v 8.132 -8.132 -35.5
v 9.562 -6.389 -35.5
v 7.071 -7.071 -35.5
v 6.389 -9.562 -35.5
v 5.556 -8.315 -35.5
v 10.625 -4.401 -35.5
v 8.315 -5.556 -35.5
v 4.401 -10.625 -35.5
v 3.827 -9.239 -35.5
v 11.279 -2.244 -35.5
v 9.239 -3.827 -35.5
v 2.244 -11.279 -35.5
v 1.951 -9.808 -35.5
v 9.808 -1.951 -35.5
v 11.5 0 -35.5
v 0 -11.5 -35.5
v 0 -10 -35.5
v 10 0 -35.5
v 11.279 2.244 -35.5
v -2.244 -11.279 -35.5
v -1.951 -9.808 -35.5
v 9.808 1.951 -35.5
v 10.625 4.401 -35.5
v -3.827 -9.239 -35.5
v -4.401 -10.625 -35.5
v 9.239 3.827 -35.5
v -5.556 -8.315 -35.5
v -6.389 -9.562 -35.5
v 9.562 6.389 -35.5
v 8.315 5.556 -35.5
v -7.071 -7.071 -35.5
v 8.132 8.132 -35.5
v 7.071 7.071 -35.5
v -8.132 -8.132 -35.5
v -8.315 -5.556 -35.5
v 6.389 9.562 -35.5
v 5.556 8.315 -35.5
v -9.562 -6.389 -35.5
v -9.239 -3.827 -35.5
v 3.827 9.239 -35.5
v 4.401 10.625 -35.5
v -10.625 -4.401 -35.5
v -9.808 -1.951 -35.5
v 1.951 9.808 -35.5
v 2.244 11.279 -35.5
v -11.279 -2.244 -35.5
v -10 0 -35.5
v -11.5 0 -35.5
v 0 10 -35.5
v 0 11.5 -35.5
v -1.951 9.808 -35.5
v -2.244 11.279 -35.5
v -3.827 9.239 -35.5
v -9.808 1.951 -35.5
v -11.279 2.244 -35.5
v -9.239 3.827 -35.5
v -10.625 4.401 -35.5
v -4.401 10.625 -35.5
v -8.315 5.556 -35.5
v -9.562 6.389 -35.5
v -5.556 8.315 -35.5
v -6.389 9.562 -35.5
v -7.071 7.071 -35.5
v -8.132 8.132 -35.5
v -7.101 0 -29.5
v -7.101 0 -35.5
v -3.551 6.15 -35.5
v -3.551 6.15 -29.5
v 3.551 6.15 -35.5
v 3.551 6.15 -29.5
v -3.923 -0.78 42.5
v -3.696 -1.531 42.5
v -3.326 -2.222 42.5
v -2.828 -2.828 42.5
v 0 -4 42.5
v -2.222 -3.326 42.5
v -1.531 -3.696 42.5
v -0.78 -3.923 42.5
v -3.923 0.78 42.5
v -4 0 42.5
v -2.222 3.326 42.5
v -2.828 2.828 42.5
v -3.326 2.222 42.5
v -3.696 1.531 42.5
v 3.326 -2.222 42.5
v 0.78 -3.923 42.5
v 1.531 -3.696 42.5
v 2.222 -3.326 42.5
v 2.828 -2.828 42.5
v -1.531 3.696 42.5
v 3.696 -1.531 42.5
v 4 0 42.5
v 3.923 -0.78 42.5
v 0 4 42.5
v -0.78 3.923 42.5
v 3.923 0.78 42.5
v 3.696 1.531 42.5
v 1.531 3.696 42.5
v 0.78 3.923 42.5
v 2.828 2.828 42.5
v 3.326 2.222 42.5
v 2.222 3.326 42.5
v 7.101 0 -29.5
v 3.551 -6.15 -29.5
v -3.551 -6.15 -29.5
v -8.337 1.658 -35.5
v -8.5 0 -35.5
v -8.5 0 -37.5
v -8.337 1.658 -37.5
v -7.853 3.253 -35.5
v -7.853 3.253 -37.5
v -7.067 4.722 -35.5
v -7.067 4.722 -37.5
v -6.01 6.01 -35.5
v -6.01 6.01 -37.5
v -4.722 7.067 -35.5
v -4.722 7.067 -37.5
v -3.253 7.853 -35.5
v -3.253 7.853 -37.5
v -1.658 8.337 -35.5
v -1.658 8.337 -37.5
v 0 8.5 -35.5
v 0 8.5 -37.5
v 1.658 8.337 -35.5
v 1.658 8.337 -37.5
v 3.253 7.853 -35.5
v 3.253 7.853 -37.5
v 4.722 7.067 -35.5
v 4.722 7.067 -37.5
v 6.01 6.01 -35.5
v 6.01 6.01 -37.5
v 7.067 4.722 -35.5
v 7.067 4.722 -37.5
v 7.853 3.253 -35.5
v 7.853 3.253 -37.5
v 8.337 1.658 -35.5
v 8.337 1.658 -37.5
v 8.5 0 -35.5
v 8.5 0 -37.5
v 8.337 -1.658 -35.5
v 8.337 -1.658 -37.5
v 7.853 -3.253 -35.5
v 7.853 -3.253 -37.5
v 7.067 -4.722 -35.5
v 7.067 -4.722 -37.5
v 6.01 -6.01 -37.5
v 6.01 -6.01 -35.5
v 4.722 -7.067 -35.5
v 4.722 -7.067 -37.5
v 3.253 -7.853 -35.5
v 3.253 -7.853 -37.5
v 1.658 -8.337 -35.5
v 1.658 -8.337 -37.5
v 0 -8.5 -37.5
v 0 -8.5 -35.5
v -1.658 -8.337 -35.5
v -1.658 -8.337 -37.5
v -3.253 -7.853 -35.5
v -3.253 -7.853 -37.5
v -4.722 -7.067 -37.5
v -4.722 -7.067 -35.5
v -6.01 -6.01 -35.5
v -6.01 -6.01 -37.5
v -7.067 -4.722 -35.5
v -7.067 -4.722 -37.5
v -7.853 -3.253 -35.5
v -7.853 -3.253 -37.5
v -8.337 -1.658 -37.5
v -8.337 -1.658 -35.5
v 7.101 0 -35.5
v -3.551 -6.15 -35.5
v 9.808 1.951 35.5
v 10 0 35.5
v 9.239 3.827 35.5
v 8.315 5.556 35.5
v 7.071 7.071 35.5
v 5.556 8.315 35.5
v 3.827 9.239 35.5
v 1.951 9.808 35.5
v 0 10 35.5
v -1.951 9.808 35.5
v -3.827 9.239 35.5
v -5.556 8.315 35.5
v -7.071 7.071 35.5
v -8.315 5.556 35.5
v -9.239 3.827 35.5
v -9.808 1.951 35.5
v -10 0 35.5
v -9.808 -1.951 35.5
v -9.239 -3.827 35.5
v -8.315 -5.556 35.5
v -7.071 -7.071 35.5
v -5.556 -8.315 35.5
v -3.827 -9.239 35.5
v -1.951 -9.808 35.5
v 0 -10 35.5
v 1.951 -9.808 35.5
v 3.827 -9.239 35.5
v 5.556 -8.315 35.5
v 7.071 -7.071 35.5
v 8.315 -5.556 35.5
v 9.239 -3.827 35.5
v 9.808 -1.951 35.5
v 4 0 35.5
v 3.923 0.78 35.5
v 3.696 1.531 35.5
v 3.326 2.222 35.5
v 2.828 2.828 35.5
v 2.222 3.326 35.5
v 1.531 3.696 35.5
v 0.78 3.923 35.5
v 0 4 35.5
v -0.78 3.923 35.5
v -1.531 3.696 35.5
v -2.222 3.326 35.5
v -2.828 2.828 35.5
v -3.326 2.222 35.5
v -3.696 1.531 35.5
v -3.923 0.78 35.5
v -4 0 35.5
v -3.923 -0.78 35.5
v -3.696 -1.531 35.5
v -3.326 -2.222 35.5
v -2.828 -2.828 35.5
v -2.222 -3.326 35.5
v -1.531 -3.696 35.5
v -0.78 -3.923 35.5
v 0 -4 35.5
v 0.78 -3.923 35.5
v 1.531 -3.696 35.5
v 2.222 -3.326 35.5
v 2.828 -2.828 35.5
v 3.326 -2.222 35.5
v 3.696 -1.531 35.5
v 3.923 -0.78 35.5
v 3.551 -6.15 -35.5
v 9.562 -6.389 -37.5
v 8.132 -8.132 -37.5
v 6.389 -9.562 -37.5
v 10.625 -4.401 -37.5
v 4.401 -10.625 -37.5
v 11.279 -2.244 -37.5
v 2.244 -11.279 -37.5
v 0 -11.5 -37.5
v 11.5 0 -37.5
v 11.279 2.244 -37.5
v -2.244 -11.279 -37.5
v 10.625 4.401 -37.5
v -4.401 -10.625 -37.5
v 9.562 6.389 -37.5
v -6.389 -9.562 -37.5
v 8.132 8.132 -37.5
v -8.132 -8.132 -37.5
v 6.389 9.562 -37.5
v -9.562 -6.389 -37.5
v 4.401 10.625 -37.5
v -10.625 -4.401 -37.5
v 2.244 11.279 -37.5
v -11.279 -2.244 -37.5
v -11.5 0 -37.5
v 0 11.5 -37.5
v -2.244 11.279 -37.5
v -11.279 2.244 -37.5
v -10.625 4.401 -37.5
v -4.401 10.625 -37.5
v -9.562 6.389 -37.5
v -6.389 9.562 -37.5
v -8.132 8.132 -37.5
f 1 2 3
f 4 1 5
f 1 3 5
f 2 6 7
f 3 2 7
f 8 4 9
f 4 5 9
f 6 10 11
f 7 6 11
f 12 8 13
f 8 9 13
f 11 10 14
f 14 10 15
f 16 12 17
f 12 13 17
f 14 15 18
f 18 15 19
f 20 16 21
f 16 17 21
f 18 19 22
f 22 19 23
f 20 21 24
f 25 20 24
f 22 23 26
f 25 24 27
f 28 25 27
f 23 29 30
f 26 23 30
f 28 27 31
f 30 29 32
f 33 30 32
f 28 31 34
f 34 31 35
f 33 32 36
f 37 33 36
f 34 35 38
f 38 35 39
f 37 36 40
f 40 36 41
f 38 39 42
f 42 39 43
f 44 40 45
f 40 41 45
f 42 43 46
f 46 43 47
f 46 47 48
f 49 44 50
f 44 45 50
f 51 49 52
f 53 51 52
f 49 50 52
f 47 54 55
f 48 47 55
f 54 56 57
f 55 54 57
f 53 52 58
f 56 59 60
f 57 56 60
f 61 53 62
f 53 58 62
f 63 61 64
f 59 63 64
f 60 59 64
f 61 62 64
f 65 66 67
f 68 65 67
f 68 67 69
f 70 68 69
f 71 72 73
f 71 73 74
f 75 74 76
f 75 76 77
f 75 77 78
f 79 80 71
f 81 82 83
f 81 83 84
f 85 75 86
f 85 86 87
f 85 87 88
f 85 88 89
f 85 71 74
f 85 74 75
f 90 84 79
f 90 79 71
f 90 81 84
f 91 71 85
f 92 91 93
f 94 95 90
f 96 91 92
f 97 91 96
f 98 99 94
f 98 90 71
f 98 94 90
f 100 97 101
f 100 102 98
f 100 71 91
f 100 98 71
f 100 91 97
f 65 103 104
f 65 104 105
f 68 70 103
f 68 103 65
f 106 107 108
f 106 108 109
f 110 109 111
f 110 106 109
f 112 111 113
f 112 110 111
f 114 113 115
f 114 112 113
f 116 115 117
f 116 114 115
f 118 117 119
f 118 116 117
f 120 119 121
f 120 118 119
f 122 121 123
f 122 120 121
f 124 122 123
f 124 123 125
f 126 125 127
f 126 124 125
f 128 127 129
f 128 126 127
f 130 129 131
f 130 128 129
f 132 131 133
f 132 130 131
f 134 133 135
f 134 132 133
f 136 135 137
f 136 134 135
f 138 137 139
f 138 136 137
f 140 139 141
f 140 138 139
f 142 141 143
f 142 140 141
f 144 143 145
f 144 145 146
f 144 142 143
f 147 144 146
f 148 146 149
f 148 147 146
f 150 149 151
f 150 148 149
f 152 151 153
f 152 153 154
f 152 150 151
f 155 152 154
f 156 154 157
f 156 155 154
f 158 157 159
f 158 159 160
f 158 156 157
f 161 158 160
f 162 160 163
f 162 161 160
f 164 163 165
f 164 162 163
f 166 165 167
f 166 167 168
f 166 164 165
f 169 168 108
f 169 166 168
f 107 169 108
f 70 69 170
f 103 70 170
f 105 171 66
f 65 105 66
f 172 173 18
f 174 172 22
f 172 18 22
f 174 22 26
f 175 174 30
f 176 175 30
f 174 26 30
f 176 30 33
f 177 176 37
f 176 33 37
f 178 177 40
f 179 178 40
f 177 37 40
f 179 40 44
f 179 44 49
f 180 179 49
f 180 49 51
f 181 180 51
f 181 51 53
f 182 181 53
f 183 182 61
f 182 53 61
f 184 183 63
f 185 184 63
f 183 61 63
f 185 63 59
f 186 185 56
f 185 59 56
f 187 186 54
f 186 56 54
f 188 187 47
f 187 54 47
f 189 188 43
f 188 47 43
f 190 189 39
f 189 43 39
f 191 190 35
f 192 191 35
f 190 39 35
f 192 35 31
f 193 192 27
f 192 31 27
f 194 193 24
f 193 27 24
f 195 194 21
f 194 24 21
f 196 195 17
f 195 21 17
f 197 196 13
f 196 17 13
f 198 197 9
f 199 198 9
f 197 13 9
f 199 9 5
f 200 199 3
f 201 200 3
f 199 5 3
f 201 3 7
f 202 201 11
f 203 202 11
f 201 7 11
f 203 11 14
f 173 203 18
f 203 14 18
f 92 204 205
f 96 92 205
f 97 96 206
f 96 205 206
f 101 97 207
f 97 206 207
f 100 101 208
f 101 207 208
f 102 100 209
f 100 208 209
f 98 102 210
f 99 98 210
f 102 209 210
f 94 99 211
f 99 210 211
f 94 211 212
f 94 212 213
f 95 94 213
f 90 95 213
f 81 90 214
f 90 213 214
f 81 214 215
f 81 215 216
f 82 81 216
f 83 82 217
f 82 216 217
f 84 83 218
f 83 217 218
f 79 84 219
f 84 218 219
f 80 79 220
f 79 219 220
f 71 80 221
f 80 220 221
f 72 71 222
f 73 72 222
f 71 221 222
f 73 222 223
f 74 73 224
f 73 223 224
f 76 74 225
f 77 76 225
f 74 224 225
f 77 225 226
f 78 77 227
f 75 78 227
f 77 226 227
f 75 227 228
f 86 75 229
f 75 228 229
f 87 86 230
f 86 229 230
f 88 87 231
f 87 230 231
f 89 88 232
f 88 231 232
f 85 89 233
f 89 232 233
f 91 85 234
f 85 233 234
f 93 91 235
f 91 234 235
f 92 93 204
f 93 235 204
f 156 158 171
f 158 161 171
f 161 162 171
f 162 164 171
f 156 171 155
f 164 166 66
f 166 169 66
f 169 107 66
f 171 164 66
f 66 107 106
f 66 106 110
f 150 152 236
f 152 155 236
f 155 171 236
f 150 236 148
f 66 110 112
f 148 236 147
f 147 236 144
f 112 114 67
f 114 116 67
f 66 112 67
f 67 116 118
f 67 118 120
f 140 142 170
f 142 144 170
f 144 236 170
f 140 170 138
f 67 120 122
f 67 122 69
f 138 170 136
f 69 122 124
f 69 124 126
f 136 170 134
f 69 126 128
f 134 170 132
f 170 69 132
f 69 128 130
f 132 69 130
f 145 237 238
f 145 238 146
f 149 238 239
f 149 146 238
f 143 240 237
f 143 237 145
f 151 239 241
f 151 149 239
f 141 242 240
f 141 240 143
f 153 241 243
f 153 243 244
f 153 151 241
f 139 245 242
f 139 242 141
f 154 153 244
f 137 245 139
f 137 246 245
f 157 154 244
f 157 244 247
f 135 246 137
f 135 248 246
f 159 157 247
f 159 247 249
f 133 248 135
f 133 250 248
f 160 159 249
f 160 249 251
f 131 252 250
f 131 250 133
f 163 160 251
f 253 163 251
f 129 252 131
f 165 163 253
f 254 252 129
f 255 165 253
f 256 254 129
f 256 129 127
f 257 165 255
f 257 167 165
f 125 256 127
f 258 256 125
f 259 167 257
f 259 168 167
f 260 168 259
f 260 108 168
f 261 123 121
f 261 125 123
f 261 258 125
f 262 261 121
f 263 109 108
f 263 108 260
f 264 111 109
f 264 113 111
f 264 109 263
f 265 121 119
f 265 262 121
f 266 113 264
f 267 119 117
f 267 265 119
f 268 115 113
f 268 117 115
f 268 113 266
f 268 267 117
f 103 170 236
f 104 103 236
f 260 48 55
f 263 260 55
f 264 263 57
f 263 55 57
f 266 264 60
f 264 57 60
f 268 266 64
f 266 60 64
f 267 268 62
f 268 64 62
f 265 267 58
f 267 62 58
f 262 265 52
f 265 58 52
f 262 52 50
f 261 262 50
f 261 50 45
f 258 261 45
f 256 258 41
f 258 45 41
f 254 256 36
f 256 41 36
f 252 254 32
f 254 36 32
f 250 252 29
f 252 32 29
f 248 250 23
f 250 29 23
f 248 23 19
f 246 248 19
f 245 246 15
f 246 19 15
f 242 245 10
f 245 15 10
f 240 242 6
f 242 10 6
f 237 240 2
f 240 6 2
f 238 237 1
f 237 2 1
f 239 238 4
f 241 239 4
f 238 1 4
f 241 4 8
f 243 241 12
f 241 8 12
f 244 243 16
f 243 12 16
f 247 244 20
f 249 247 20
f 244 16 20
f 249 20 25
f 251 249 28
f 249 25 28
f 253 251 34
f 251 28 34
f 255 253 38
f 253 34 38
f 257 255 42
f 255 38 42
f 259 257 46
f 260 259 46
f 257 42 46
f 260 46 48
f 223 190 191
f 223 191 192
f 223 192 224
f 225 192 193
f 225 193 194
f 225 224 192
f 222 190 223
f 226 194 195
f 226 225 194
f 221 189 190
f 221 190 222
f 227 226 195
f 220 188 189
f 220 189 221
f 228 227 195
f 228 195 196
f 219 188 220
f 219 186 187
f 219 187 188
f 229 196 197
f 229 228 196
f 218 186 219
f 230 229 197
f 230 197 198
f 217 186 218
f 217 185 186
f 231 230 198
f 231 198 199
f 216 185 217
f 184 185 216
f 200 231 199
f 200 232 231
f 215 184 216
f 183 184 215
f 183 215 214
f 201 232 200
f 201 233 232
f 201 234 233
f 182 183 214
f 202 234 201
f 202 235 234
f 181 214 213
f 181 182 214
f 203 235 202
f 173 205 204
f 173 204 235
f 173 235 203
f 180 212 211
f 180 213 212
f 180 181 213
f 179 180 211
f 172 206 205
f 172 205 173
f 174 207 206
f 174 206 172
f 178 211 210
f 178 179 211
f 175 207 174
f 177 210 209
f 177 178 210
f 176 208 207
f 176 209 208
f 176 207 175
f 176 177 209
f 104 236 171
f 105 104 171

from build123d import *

# Parameters (mm, degrees)
BOSS_EXTRUDE1_DEPTH      = 35.5
BOSS_EXTRUDE1_DEPTH_BACK = 35.5
SKETCH1_R                = 10
CUT_EXTRUDE1_DEPTH       = 6
SKETCH3_R                = 4
BOSS_EXTRUDE2_DEPTH      = 7
SKETCH4_R                = 11.5
SKETCH4_R_2              = 8.5
BOSS_EXTRUDE3_DEPTH      = 2


with BuildPart() as part:
    # Sketch1 → Boss-Extrude1 (new, two sides: drawn at the far end of the back side and taken through both)
    with BuildSketch(Plane.XY.offset(-BOSS_EXTRUDE1_DEPTH_BACK)):
        Circle(SKETCH1_R)
    extrude(amount=BOSS_EXTRUDE1_DEPTH + BOSS_EXTRUDE1_DEPTH_BACK)

    # Sketch2 → Cut-Extrude1 (cut)
    with BuildSketch(Plane(origin=(0, 0, -35.5), x_dir=(-1, 0, 0), z_dir=(0, 0, -1))):
        Polygon((7.101408311, 0), (3.550704156, 6.15), (-3.550704156, 6.15), (-7.101408311, 0), (-3.550704156, -6.15), (3.550704156, -6.15), align=None)
    extrude(amount=-CUT_EXTRUDE1_DEPTH, mode=Mode.SUBTRACT)

    # Sketch3 → Boss-Extrude2 (add)
    with BuildSketch(Plane.XY.offset(35.5)):
        Circle(SKETCH3_R)
    extrude(amount=BOSS_EXTRUDE2_DEPTH)

    # Sketch4 → Boss-Extrude3 (add)
    with BuildSketch(Plane(origin=(0, 0, -35.5), x_dir=(-1, 0, 0), z_dir=(0, 0, -1))):
        Circle(SKETCH4_R)
        Circle(SKETCH4_R_2, mode=Mode.SUBTRACT)
    extrude(amount=BOSS_EXTRUDE3_DEPTH)


solid = part.part
